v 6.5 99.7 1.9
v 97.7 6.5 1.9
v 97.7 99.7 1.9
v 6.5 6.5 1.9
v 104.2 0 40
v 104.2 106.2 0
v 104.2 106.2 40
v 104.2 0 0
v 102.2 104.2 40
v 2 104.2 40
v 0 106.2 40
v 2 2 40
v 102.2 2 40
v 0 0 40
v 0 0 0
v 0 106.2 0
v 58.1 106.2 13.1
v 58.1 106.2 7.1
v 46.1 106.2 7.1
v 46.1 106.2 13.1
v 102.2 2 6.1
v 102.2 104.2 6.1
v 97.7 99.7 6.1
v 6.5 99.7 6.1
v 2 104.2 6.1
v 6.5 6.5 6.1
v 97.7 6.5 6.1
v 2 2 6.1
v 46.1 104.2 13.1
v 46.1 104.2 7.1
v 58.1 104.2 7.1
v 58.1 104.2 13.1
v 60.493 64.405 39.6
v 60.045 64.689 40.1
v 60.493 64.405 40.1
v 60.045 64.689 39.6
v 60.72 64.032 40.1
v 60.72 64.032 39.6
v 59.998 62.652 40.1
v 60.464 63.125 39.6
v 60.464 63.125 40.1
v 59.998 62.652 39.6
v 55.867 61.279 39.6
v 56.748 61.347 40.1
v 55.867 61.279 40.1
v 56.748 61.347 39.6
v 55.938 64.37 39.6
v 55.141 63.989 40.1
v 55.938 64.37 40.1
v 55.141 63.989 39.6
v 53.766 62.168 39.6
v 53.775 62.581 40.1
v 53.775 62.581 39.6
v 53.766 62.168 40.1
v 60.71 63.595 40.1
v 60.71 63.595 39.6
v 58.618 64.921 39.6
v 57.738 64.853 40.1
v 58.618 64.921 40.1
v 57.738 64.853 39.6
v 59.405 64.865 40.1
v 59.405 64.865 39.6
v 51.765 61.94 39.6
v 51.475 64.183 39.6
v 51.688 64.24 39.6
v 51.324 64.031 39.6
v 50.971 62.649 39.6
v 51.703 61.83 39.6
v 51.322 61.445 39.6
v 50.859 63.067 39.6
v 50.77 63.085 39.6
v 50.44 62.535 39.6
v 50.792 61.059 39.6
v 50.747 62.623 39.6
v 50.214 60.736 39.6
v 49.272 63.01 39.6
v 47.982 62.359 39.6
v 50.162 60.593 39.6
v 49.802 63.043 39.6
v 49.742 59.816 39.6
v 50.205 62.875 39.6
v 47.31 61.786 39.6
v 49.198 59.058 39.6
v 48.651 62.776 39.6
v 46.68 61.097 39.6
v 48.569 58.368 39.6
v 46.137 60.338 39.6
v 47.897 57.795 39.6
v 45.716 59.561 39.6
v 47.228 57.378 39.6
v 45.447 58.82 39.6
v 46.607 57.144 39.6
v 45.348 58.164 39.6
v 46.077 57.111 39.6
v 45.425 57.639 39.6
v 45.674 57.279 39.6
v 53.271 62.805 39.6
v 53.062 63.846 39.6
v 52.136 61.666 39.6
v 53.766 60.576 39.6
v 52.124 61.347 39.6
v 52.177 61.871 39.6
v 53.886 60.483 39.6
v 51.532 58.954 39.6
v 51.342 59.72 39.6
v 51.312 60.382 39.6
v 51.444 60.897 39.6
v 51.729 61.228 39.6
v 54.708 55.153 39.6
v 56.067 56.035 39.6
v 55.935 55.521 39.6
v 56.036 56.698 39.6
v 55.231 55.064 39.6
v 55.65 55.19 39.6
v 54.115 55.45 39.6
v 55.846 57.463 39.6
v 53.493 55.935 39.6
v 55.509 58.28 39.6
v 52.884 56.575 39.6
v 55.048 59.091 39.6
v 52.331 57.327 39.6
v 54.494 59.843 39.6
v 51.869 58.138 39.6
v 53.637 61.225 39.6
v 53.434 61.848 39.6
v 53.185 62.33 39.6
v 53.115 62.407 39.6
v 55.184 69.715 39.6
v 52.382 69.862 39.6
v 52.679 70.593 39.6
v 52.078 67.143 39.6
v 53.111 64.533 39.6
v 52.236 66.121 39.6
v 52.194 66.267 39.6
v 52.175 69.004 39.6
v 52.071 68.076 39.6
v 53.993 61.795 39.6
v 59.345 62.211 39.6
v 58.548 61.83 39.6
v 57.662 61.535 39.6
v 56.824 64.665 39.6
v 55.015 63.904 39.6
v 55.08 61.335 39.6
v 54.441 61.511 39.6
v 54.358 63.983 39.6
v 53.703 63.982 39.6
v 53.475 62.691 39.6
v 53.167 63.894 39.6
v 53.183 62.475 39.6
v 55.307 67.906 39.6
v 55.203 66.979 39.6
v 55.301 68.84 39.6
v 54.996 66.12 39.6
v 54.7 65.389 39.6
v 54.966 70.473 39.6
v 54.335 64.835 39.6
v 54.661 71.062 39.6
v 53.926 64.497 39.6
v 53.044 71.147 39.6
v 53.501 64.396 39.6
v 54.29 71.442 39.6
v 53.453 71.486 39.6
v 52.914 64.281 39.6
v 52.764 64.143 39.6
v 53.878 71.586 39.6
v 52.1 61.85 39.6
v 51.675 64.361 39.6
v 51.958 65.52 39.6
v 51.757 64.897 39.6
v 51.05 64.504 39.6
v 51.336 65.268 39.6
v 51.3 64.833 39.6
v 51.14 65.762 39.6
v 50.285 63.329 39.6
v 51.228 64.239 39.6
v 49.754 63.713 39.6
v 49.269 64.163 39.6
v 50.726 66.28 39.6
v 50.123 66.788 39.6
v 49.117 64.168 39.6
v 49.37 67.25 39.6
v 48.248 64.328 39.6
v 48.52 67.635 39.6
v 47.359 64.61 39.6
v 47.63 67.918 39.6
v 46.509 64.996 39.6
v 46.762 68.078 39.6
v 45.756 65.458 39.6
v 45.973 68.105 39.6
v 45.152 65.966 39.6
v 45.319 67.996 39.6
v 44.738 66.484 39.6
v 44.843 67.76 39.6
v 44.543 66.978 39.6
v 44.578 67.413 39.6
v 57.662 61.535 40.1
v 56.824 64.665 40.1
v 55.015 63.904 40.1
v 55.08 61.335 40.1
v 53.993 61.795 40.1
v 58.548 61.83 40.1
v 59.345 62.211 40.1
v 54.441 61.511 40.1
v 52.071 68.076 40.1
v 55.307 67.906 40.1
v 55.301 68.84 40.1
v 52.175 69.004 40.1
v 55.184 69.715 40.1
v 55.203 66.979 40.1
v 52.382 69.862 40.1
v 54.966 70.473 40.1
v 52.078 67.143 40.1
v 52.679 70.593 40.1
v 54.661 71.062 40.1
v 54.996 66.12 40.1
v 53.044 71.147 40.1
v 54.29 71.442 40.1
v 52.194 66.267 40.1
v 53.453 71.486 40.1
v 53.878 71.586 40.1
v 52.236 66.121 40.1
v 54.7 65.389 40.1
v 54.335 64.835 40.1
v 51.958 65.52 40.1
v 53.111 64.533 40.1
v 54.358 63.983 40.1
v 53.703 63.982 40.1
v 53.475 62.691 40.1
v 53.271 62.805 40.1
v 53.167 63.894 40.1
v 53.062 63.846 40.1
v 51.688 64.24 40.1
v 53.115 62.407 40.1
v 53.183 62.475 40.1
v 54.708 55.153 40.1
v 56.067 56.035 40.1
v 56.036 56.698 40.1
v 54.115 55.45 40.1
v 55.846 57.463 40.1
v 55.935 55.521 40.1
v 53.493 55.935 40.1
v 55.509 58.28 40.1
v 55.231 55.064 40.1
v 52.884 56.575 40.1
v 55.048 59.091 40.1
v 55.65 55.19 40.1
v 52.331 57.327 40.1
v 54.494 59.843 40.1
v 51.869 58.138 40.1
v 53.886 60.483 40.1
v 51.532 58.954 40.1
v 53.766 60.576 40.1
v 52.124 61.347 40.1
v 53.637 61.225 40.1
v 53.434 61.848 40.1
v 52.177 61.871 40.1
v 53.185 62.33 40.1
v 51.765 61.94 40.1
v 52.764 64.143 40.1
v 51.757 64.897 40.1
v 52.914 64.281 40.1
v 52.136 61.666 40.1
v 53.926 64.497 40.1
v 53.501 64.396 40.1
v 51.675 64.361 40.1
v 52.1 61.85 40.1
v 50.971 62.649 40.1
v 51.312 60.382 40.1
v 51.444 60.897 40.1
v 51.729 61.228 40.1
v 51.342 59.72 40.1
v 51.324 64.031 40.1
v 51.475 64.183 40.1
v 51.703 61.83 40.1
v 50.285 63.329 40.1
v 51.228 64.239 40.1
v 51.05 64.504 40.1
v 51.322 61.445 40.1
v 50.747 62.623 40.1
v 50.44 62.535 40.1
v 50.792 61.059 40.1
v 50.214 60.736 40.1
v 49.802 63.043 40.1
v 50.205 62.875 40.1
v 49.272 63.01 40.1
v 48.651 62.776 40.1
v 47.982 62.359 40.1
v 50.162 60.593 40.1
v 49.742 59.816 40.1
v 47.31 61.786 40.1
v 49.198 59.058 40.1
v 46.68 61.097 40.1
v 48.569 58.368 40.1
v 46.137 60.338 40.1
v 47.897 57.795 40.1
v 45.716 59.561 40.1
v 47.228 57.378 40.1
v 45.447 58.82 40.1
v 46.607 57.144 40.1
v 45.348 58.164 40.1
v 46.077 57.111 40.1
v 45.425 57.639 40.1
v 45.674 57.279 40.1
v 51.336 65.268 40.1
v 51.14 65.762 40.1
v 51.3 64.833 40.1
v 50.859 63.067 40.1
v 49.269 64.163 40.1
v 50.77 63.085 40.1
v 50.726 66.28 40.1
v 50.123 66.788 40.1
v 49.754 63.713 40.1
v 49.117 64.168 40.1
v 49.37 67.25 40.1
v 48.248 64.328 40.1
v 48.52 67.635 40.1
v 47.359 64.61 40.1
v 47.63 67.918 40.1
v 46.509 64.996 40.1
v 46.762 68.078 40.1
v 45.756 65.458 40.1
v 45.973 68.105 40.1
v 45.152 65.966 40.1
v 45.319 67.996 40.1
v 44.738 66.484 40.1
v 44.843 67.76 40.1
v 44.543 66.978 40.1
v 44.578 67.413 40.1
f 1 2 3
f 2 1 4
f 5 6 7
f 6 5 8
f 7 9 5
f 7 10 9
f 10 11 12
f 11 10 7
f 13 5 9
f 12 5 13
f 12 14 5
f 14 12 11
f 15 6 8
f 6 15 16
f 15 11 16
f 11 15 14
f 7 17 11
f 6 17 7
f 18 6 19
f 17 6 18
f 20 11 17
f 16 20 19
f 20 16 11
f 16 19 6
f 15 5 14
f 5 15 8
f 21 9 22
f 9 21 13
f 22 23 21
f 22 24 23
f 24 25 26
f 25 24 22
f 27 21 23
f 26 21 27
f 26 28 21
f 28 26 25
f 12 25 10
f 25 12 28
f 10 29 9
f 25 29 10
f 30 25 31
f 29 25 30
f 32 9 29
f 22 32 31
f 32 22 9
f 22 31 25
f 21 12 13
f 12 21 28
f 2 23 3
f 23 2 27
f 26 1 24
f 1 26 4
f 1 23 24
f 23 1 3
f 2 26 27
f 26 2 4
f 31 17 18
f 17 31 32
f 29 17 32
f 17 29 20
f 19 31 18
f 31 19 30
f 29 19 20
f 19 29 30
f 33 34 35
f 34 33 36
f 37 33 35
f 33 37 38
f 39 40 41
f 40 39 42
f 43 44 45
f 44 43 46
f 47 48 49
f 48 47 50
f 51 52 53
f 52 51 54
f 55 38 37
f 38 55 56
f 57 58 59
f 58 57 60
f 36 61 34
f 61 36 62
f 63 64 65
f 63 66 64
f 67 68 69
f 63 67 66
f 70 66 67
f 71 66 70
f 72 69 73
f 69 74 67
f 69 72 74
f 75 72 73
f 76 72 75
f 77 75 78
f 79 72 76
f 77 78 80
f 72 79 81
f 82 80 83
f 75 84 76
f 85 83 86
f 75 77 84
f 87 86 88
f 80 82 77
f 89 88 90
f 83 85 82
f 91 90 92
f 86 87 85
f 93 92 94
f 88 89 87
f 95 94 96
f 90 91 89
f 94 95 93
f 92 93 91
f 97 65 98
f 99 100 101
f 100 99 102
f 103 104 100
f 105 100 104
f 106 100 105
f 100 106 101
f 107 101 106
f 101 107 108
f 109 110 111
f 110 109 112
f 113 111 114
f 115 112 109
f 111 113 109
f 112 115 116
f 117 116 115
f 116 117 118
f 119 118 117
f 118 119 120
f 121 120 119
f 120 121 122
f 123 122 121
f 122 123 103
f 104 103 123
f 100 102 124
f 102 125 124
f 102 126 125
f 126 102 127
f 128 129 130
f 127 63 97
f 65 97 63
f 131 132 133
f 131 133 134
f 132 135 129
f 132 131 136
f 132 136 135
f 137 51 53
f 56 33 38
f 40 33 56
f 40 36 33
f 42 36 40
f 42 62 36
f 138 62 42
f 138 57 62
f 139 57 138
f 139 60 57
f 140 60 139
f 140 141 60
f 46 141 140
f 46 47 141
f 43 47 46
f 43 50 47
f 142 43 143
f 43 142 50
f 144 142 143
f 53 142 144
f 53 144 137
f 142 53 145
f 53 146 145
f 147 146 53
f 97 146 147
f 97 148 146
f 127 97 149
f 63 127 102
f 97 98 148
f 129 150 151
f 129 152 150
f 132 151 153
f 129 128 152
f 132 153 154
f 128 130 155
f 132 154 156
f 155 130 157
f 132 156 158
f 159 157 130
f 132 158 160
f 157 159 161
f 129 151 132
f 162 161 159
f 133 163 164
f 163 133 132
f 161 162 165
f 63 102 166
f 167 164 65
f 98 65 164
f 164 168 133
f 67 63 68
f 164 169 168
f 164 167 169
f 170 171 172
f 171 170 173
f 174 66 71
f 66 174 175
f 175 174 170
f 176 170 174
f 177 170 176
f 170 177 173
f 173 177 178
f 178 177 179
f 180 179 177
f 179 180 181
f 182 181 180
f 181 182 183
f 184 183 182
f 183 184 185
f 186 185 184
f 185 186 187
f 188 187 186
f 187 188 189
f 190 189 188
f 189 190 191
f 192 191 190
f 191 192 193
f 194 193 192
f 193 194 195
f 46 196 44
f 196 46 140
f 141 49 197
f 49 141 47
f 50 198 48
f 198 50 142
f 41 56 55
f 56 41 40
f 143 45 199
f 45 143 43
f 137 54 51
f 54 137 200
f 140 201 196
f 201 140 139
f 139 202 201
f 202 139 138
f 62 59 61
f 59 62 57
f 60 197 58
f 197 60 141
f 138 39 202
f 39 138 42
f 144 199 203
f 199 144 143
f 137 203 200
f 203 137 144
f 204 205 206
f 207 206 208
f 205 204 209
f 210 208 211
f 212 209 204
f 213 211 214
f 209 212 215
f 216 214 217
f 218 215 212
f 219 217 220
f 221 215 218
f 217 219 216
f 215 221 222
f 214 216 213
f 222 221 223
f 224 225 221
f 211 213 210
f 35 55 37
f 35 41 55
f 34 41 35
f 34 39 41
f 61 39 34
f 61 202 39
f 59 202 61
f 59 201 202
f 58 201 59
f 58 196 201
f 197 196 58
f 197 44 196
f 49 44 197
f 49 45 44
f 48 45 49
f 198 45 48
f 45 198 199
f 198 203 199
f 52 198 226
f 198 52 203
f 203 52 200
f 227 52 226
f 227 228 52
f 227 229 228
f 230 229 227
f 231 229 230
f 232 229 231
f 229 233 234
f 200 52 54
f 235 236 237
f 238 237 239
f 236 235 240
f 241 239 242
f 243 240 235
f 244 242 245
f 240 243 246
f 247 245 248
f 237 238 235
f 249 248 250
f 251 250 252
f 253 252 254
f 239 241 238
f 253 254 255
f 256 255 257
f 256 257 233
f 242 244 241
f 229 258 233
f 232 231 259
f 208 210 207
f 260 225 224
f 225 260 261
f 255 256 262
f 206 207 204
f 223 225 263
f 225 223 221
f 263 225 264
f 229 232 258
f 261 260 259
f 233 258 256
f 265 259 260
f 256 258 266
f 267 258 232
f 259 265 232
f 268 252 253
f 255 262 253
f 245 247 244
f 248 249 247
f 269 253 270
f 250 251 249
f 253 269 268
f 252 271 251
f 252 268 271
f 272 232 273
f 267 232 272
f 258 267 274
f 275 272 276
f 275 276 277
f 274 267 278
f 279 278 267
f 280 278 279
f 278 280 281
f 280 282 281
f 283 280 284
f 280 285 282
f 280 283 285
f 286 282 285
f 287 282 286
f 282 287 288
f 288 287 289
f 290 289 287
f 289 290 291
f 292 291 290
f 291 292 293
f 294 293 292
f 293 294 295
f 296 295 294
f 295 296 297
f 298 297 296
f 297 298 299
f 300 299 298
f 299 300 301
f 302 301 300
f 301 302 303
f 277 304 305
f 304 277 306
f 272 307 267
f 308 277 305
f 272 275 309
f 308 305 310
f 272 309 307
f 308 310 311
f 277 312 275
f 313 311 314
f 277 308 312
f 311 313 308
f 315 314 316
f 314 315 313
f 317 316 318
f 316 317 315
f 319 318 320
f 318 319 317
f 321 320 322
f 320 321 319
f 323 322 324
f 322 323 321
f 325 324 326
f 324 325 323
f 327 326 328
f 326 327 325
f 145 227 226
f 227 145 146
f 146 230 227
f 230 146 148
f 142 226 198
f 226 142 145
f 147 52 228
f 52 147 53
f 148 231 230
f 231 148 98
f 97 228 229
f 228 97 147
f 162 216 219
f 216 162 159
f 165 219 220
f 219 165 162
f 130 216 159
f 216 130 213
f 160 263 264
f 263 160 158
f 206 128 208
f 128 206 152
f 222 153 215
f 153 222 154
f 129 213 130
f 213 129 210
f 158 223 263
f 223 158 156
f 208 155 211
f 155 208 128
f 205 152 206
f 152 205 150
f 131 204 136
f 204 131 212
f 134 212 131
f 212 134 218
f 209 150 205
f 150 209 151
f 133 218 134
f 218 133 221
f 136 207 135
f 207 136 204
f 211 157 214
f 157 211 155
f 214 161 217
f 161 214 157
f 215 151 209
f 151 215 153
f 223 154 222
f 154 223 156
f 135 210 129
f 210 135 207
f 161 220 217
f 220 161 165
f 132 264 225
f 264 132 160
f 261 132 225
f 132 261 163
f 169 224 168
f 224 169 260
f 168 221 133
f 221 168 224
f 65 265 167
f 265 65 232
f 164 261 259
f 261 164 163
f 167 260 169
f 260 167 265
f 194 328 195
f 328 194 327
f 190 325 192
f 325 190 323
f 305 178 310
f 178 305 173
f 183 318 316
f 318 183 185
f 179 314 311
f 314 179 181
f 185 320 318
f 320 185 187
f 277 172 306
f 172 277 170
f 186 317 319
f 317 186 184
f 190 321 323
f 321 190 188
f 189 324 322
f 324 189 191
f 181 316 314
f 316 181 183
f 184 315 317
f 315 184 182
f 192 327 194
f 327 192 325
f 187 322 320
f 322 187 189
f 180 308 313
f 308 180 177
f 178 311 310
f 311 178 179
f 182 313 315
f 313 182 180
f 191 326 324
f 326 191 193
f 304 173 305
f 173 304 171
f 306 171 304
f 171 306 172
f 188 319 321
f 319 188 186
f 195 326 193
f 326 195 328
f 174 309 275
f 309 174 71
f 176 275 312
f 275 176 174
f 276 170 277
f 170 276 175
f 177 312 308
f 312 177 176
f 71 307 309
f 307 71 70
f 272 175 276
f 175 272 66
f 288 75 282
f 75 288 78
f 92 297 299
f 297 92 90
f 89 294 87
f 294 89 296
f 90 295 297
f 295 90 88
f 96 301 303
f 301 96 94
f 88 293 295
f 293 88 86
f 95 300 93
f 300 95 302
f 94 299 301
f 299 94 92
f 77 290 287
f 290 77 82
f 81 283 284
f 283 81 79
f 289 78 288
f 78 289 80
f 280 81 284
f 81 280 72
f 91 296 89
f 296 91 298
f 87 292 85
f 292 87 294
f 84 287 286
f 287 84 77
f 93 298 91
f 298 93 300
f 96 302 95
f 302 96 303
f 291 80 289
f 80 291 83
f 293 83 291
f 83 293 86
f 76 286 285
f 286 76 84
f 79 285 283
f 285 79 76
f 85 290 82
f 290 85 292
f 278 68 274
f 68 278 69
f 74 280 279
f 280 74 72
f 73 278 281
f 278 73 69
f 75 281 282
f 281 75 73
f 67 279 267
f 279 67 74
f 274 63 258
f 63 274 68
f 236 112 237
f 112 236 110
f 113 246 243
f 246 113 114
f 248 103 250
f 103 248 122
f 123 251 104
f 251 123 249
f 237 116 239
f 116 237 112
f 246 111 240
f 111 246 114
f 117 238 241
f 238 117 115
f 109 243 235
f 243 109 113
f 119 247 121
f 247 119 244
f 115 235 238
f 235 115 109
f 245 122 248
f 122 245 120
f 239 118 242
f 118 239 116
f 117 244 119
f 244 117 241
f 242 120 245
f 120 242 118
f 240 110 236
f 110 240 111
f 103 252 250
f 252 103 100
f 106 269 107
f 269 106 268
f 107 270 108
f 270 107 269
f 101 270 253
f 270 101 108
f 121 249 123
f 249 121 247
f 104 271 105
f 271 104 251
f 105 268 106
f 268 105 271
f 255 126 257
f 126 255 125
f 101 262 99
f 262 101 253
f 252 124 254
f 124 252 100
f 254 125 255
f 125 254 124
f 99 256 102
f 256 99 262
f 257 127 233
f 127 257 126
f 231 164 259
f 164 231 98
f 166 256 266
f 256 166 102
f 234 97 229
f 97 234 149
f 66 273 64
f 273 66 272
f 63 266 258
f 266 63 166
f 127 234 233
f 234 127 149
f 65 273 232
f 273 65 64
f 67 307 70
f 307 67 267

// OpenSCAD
// ESP32 Bus Dashboard Enclosure v3
// Kiko's Rose: {-0.1560, 1.0325, 1800.0}
//
// Two-part design: bezel + box
//   Bezel: frame that sits on TOP of e-paper PCB, screws into it
//   Box: 40mm deep, walls fully wrap around PCB edges (nothing visible from side)
//   Assembly: display glass -> bezel -> PCB -> pins drop into box recess
//
// Hardware:
//   - WeAct 4.2" e-paper module (GDEY042Z98 tri-color), PCB 89.6x91.6x1.6mm
//   - ESP32 dev board w/ CH340, 45x25mm + 10mm antenna
//   - 146074 LiPo battery: 14x60x74mm (10000mAh)

/* [Display Module - WeAct 4.2" e-paper] */
epd_pcb_w = 89.6;       epd_pcb_h = 91.6;       epd_pcb_t = 1.6;
disp_w = 84.8;           disp_h = 63.6;
disp_off_x = (epd_pcb_w - disp_w) / 2;  disp_off_y = (epd_pcb_h - disp_h) / 2;
hole_d = 3.0;            // PCB mounting hole diameter
hole_off_x = 6.4;        hole_off_y_bot = 2.8;   hole_off_y_top = 1.93;

/* [ESP32 Dev Board] */
esp32_w = 55.0;  esp32_h = 25.0;  esp32_t = 12.0;
esp32_usb_w = 12.0;  esp32_usb_h = 6.0;

/* [Battery - 146074 LiPo] */
bat_w = 74.0;  bat_h = 60.0;  bat_t = 14.0;

/* [Bezel] */
bezel_t = 2.0;           // thickness
bezel_w = epd_pcb_w + 0.6;  // 90.2mm — slightly larger than PCB
bezel_h = epd_pcb_h + 0.6;  // 92.2mm
b_win_w = disp_w;        // display window in bezel = display active area
b_win_h = disp_h;
b_win_x = (bezel_w - b_win_w) / 2;
b_win_y = (bezel_h - b_win_h) / 2;
pin_d = 3.0;            // alignment pin diameter
pin_h = 6.0;            // pin height (through PCB into box)

/* [Box] */
wall = 2.0;              // wall thickness
tolerance = 0.3;         // clearance
gap = 0.5;               // between layers
max_depth = 40.0;        // total depth

// Box inner cavity is LARGER than PCB/bezel — walls wrap around them
// bezel_inset: how far from the outer wall the bezel sits
bezel_inset = 5.0;       // mm — walls extend past bezel on all 4 sides
cav_inner_w = bezel_w + bezel_inset * 2;  // 100.2mm
cav_inner_h = bezel_h + bezel_inset * 2;  // 102.2mm
outer_w = cav_inner_w + wall * 2;           // 104.2mm
outer_h = cav_inner_h + wall * 2;           // 106.2mm
box_depth = max_depth;

// Top recess: pocket where the bezel + PCB sandwich drops in, flush with top rim
recess_depth = bezel_t + epd_pcb_t + gap;   // 4.1mm
recess_w = bezel_w + 1.0;                   // 91.2mm — a little clearance
recess_h = bezel_h + 1.0;                   // 93.2mm
recess_x = (outer_w - recess_w) / 2;
recess_y = (outer_h - recess_h) / 2;
// Display glass sits slightly below the bezel face
glass_recess = 0.3;

// Cavity for ESP32 and battery starts below the recess
cavity_z = wall + recess_depth;
cavity_depth = bat_t + gap;  // 14.5mm

// Component positions — centered in the inner cavity
bat_x = wall + (cav_inner_w - bat_w) / 2;
bat_y = wall + tolerance;
esp32_x = wall + (cav_inner_w - esp32_w) / 2;
esp32_y = bat_y + bat_h + gap;
esp32_z = cavity_z + (bat_t - esp32_t) / 2;

// USB cutout (top edge of box, centered on ESP32)
usb_cut_x = esp32_x + (esp32_w - esp32_usb_w) / 2;
usb_cut_y = outer_h - wall;
usb_cut_z = esp32_z;

// Pin hole positions (in the recess floor, matching bezel pins)
// Bezel is centered in recess, pins relative to bezel
pin_recess_off_x = (recess_w - bezel_w) / 2;
pin_recess_off_y = (recess_h - bezel_h) / 2;

echo(str("Box: ", outer_w, " x ", outer_h, " x ", box_depth, " mm"));
echo(str("Cavity inner: ", cav_inner_w, " x ", cav_inner_h, " mm"));
echo(str("Top recess: ", recess_w, " x ", recess_h, " x ", recess_depth, " mm (centered)"));
echo(str("Bezel: ", bezel_w, " x ", bezel_h, " x ", bezel_t, " mm"));
echo(str("  Display window: ", b_win_w, "x", b_win_h, " at (", b_win_x, ", ", b_win_y, ")"));
echo(str("  Frame left=", b_win_x, " right=", bezel_w - b_win_x - b_win_w, " top=", b_win_y, " bottom=", bezel_h - b_win_y - b_win_h));
echo(str("PCB fully wrapped by ", bezel_inset, "mm walls on all sides"));

/* [Ventilation] */
vent_slots = 8;  vent_w = 2.5;  vent_h = 40.0;
/* [Wall Mount] */
mount_hole_d = 5.0;  mount_hole_off = 12.0;
/* [Printer] */
layer_h = 0.2;

// ─── MODULES ───

module bezel() {
    difference() {
        cube([bezel_w, bezel_h, bezel_t]);
        // Display window (centered)
        translate([b_win_x, b_win_y, -0.1])
            cube([b_win_w, b_win_h, bezel_t + 0.2]);
        // Screw clearance holes (matching PCB)
        for (x = [hole_off_x, epd_pcb_w - hole_off_x]) {
            for (y = [hole_off_y_bot, epd_pcb_h - hole_off_y_top]) {
                translate([x, bezel_h - y, -0.1])
                    cylinder(d = hole_d + 0.2, h = bezel_t + 0.3, $fn = 16);
            }
        }
        // Countersink for screw heads
        for (x = [hole_off_x, epd_pcb_w - hole_off_x]) {
            for (y = [hole_off_y_bot, epd_pcb_h - hole_off_y_top]) {
                translate([x, bezel_h - y, bezel_t - 0.5])
                    cylinder(d1 = hole_d + 3, d2 = hole_d + 0.2, h = 0.6, $fn = 16);
            }
        }
    }
    // Alignment pins (protrude from bezel back, through PCB, into box)
    for (x = [hole_off_x, epd_pcb_w - hole_off_x]) {
        for (y = [hole_off_y_bot, epd_pcb_h - hole_off_y_top]) {
            translate([x, bezel_h - y, 0])
                cylinder(d = pin_d - 0.2, h = pin_h, $fn = 16);
        }
    }
}

module box() {
    difference() {
        // Outer shell
        cube([outer_w, outer_h, box_depth]);
        
        // Main cavity (inner box, larger than PCB)
        translate([wall, wall, cavity_z])
            cube([cav_inner_w, cav_inner_h, box_depth - cavity_z + 1]);
        
        // Top recess — bezel+PCB drops in here
        translate([recess_x, recess_y, wall - 0.1])
            cube([recess_w, recess_h, recess_depth + 0.2]);
        
        // Glass recess — tiny step deeper within the recess for the display glass
        gx = recess_x + (recess_w - disp_w) / 2;
        gy = recess_y + (recess_h - disp_h) / 2;
        translate([gx, gy, wall + bezel_t - glass_recess - 0.1])
            cube([disp_w, disp_h, glass_recess + 0.2]);
        
        // Pin holes in recess floor
        for (x = [hole_off_x, epd_pcb_w - hole_off_x]) {
            for (y = [hole_off_y_bot, epd_pcb_h - hole_off_y_top]) {
                px = recess_x + pin_recess_off_x + x;
                py = recess_y + pin_recess_off_y + (bezel_h - y);
                translate([px, py, wall - 0.1])
                    cylinder(d = pin_d, h = recess_depth + 1, $fn = 16);
            }
        }
        
        // USB cutout (top edge)
        translate([usb_cut_x, usb_cut_y - 0.5, usb_cut_z])
            cube([esp32_usb_w, wall + 1.5, esp32_usb_h]);
        
        // Battery pocket
        translate([bat_x, bat_y, cavity_z])
            cube([bat_w + tolerance, bat_h + tolerance, bat_t + gap]);
        
        // ESP32 pocket
        translate([esp32_x, esp32_y, esp32_z])
            cube([esp32_w + tolerance, esp32_h + tolerance, esp32_t + gap]);
        
        // Ventilation slots (back wall)
        slot_spacing = (cav_inner_w - 20) / (vent_slots + 1);
        for (i = [1:vent_slots]) {
            sx = wall + 10 + i * slot_spacing;
            translate([sx, wall + 15, box_depth - wall - 0.1])
                cube([vent_w, cav_inner_h - 30, wall + 0.3]);
        }
        
        // Wall-mount holes (back wall)
        for (x = [mount_hole_off, outer_w - mount_hole_off]) {
            for (y = [mount_hole_off, outer_h - mount_hole_off]) {
                translate([x, y, box_depth - wall - 0.1])
                    cylinder(d = mount_hole_d, h = wall + 0.3, $fn = 16);
                translate([x, y, box_depth - wall - 0.5])
                    cylinder(d1 = mount_hole_d, d2 = mount_hole_d + 3, h = 1.0, $fn = 16);
            }
        }
    }
    
    // Kiko's Rose engraving on inside of back wall
    rose_size = 18.0;
    rx = outer_w / 2;
    ry = outer_h / 2 + 10;
    for (i = [0:4]) {
        a = i * 72;
        dx = (rose_size / 3.5) * cos(a);
        dy = (rose_size / 3.5) * sin(a);
        translate([rx + dx, ry + dy, box_depth - 0.4])
            rotate([0, 0, a + 15])
                scale([1.0, 0.45])
                    cylinder(d = (rose_size / 3.5) * 1.4, h = 0.5, $fn = 24);
        translate([rx + dx * 0.55, ry + dy * 0.55, box_depth - 0.4])
            rotate([0, 0, a - 10])
                scale([1.0, 0.35])
                    cylinder(d = (rose_size / 3.5) * 0.9, h = 0.5, $fn = 20);
    }
    translate([rx, ry, box_depth - 0.4])
        cylinder(d = 2.5, h = 0.5, $fn = 12);
}

// ─── RENDER ───

// For box-only: comment out the bezel line below; uncomment "box()"
box();

// For bezel-only: uncomment this, comment out "box()" above
// translate([0, outer_h + 10, 0]) bezel();

echo("========================================");
echo(str("  Box:  ", outer_w, " x ", outer_h, " x ", box_depth, " mm"));
echo(str("  Bezel: ", bezel_w, " x ", bezel_h, " x ", bezel_t, " mm"));
echo(str("  PCB fully wrapped by ", bezel_inset, "mm walls on all 4 sides"));
echo(str("  Print: box back-face DOWN, bezel flat, no supports"));
echo(str("  ~", ceil(box_depth / layer_h), " / ", ceil(bezel_t / layer_h), " layers"));
